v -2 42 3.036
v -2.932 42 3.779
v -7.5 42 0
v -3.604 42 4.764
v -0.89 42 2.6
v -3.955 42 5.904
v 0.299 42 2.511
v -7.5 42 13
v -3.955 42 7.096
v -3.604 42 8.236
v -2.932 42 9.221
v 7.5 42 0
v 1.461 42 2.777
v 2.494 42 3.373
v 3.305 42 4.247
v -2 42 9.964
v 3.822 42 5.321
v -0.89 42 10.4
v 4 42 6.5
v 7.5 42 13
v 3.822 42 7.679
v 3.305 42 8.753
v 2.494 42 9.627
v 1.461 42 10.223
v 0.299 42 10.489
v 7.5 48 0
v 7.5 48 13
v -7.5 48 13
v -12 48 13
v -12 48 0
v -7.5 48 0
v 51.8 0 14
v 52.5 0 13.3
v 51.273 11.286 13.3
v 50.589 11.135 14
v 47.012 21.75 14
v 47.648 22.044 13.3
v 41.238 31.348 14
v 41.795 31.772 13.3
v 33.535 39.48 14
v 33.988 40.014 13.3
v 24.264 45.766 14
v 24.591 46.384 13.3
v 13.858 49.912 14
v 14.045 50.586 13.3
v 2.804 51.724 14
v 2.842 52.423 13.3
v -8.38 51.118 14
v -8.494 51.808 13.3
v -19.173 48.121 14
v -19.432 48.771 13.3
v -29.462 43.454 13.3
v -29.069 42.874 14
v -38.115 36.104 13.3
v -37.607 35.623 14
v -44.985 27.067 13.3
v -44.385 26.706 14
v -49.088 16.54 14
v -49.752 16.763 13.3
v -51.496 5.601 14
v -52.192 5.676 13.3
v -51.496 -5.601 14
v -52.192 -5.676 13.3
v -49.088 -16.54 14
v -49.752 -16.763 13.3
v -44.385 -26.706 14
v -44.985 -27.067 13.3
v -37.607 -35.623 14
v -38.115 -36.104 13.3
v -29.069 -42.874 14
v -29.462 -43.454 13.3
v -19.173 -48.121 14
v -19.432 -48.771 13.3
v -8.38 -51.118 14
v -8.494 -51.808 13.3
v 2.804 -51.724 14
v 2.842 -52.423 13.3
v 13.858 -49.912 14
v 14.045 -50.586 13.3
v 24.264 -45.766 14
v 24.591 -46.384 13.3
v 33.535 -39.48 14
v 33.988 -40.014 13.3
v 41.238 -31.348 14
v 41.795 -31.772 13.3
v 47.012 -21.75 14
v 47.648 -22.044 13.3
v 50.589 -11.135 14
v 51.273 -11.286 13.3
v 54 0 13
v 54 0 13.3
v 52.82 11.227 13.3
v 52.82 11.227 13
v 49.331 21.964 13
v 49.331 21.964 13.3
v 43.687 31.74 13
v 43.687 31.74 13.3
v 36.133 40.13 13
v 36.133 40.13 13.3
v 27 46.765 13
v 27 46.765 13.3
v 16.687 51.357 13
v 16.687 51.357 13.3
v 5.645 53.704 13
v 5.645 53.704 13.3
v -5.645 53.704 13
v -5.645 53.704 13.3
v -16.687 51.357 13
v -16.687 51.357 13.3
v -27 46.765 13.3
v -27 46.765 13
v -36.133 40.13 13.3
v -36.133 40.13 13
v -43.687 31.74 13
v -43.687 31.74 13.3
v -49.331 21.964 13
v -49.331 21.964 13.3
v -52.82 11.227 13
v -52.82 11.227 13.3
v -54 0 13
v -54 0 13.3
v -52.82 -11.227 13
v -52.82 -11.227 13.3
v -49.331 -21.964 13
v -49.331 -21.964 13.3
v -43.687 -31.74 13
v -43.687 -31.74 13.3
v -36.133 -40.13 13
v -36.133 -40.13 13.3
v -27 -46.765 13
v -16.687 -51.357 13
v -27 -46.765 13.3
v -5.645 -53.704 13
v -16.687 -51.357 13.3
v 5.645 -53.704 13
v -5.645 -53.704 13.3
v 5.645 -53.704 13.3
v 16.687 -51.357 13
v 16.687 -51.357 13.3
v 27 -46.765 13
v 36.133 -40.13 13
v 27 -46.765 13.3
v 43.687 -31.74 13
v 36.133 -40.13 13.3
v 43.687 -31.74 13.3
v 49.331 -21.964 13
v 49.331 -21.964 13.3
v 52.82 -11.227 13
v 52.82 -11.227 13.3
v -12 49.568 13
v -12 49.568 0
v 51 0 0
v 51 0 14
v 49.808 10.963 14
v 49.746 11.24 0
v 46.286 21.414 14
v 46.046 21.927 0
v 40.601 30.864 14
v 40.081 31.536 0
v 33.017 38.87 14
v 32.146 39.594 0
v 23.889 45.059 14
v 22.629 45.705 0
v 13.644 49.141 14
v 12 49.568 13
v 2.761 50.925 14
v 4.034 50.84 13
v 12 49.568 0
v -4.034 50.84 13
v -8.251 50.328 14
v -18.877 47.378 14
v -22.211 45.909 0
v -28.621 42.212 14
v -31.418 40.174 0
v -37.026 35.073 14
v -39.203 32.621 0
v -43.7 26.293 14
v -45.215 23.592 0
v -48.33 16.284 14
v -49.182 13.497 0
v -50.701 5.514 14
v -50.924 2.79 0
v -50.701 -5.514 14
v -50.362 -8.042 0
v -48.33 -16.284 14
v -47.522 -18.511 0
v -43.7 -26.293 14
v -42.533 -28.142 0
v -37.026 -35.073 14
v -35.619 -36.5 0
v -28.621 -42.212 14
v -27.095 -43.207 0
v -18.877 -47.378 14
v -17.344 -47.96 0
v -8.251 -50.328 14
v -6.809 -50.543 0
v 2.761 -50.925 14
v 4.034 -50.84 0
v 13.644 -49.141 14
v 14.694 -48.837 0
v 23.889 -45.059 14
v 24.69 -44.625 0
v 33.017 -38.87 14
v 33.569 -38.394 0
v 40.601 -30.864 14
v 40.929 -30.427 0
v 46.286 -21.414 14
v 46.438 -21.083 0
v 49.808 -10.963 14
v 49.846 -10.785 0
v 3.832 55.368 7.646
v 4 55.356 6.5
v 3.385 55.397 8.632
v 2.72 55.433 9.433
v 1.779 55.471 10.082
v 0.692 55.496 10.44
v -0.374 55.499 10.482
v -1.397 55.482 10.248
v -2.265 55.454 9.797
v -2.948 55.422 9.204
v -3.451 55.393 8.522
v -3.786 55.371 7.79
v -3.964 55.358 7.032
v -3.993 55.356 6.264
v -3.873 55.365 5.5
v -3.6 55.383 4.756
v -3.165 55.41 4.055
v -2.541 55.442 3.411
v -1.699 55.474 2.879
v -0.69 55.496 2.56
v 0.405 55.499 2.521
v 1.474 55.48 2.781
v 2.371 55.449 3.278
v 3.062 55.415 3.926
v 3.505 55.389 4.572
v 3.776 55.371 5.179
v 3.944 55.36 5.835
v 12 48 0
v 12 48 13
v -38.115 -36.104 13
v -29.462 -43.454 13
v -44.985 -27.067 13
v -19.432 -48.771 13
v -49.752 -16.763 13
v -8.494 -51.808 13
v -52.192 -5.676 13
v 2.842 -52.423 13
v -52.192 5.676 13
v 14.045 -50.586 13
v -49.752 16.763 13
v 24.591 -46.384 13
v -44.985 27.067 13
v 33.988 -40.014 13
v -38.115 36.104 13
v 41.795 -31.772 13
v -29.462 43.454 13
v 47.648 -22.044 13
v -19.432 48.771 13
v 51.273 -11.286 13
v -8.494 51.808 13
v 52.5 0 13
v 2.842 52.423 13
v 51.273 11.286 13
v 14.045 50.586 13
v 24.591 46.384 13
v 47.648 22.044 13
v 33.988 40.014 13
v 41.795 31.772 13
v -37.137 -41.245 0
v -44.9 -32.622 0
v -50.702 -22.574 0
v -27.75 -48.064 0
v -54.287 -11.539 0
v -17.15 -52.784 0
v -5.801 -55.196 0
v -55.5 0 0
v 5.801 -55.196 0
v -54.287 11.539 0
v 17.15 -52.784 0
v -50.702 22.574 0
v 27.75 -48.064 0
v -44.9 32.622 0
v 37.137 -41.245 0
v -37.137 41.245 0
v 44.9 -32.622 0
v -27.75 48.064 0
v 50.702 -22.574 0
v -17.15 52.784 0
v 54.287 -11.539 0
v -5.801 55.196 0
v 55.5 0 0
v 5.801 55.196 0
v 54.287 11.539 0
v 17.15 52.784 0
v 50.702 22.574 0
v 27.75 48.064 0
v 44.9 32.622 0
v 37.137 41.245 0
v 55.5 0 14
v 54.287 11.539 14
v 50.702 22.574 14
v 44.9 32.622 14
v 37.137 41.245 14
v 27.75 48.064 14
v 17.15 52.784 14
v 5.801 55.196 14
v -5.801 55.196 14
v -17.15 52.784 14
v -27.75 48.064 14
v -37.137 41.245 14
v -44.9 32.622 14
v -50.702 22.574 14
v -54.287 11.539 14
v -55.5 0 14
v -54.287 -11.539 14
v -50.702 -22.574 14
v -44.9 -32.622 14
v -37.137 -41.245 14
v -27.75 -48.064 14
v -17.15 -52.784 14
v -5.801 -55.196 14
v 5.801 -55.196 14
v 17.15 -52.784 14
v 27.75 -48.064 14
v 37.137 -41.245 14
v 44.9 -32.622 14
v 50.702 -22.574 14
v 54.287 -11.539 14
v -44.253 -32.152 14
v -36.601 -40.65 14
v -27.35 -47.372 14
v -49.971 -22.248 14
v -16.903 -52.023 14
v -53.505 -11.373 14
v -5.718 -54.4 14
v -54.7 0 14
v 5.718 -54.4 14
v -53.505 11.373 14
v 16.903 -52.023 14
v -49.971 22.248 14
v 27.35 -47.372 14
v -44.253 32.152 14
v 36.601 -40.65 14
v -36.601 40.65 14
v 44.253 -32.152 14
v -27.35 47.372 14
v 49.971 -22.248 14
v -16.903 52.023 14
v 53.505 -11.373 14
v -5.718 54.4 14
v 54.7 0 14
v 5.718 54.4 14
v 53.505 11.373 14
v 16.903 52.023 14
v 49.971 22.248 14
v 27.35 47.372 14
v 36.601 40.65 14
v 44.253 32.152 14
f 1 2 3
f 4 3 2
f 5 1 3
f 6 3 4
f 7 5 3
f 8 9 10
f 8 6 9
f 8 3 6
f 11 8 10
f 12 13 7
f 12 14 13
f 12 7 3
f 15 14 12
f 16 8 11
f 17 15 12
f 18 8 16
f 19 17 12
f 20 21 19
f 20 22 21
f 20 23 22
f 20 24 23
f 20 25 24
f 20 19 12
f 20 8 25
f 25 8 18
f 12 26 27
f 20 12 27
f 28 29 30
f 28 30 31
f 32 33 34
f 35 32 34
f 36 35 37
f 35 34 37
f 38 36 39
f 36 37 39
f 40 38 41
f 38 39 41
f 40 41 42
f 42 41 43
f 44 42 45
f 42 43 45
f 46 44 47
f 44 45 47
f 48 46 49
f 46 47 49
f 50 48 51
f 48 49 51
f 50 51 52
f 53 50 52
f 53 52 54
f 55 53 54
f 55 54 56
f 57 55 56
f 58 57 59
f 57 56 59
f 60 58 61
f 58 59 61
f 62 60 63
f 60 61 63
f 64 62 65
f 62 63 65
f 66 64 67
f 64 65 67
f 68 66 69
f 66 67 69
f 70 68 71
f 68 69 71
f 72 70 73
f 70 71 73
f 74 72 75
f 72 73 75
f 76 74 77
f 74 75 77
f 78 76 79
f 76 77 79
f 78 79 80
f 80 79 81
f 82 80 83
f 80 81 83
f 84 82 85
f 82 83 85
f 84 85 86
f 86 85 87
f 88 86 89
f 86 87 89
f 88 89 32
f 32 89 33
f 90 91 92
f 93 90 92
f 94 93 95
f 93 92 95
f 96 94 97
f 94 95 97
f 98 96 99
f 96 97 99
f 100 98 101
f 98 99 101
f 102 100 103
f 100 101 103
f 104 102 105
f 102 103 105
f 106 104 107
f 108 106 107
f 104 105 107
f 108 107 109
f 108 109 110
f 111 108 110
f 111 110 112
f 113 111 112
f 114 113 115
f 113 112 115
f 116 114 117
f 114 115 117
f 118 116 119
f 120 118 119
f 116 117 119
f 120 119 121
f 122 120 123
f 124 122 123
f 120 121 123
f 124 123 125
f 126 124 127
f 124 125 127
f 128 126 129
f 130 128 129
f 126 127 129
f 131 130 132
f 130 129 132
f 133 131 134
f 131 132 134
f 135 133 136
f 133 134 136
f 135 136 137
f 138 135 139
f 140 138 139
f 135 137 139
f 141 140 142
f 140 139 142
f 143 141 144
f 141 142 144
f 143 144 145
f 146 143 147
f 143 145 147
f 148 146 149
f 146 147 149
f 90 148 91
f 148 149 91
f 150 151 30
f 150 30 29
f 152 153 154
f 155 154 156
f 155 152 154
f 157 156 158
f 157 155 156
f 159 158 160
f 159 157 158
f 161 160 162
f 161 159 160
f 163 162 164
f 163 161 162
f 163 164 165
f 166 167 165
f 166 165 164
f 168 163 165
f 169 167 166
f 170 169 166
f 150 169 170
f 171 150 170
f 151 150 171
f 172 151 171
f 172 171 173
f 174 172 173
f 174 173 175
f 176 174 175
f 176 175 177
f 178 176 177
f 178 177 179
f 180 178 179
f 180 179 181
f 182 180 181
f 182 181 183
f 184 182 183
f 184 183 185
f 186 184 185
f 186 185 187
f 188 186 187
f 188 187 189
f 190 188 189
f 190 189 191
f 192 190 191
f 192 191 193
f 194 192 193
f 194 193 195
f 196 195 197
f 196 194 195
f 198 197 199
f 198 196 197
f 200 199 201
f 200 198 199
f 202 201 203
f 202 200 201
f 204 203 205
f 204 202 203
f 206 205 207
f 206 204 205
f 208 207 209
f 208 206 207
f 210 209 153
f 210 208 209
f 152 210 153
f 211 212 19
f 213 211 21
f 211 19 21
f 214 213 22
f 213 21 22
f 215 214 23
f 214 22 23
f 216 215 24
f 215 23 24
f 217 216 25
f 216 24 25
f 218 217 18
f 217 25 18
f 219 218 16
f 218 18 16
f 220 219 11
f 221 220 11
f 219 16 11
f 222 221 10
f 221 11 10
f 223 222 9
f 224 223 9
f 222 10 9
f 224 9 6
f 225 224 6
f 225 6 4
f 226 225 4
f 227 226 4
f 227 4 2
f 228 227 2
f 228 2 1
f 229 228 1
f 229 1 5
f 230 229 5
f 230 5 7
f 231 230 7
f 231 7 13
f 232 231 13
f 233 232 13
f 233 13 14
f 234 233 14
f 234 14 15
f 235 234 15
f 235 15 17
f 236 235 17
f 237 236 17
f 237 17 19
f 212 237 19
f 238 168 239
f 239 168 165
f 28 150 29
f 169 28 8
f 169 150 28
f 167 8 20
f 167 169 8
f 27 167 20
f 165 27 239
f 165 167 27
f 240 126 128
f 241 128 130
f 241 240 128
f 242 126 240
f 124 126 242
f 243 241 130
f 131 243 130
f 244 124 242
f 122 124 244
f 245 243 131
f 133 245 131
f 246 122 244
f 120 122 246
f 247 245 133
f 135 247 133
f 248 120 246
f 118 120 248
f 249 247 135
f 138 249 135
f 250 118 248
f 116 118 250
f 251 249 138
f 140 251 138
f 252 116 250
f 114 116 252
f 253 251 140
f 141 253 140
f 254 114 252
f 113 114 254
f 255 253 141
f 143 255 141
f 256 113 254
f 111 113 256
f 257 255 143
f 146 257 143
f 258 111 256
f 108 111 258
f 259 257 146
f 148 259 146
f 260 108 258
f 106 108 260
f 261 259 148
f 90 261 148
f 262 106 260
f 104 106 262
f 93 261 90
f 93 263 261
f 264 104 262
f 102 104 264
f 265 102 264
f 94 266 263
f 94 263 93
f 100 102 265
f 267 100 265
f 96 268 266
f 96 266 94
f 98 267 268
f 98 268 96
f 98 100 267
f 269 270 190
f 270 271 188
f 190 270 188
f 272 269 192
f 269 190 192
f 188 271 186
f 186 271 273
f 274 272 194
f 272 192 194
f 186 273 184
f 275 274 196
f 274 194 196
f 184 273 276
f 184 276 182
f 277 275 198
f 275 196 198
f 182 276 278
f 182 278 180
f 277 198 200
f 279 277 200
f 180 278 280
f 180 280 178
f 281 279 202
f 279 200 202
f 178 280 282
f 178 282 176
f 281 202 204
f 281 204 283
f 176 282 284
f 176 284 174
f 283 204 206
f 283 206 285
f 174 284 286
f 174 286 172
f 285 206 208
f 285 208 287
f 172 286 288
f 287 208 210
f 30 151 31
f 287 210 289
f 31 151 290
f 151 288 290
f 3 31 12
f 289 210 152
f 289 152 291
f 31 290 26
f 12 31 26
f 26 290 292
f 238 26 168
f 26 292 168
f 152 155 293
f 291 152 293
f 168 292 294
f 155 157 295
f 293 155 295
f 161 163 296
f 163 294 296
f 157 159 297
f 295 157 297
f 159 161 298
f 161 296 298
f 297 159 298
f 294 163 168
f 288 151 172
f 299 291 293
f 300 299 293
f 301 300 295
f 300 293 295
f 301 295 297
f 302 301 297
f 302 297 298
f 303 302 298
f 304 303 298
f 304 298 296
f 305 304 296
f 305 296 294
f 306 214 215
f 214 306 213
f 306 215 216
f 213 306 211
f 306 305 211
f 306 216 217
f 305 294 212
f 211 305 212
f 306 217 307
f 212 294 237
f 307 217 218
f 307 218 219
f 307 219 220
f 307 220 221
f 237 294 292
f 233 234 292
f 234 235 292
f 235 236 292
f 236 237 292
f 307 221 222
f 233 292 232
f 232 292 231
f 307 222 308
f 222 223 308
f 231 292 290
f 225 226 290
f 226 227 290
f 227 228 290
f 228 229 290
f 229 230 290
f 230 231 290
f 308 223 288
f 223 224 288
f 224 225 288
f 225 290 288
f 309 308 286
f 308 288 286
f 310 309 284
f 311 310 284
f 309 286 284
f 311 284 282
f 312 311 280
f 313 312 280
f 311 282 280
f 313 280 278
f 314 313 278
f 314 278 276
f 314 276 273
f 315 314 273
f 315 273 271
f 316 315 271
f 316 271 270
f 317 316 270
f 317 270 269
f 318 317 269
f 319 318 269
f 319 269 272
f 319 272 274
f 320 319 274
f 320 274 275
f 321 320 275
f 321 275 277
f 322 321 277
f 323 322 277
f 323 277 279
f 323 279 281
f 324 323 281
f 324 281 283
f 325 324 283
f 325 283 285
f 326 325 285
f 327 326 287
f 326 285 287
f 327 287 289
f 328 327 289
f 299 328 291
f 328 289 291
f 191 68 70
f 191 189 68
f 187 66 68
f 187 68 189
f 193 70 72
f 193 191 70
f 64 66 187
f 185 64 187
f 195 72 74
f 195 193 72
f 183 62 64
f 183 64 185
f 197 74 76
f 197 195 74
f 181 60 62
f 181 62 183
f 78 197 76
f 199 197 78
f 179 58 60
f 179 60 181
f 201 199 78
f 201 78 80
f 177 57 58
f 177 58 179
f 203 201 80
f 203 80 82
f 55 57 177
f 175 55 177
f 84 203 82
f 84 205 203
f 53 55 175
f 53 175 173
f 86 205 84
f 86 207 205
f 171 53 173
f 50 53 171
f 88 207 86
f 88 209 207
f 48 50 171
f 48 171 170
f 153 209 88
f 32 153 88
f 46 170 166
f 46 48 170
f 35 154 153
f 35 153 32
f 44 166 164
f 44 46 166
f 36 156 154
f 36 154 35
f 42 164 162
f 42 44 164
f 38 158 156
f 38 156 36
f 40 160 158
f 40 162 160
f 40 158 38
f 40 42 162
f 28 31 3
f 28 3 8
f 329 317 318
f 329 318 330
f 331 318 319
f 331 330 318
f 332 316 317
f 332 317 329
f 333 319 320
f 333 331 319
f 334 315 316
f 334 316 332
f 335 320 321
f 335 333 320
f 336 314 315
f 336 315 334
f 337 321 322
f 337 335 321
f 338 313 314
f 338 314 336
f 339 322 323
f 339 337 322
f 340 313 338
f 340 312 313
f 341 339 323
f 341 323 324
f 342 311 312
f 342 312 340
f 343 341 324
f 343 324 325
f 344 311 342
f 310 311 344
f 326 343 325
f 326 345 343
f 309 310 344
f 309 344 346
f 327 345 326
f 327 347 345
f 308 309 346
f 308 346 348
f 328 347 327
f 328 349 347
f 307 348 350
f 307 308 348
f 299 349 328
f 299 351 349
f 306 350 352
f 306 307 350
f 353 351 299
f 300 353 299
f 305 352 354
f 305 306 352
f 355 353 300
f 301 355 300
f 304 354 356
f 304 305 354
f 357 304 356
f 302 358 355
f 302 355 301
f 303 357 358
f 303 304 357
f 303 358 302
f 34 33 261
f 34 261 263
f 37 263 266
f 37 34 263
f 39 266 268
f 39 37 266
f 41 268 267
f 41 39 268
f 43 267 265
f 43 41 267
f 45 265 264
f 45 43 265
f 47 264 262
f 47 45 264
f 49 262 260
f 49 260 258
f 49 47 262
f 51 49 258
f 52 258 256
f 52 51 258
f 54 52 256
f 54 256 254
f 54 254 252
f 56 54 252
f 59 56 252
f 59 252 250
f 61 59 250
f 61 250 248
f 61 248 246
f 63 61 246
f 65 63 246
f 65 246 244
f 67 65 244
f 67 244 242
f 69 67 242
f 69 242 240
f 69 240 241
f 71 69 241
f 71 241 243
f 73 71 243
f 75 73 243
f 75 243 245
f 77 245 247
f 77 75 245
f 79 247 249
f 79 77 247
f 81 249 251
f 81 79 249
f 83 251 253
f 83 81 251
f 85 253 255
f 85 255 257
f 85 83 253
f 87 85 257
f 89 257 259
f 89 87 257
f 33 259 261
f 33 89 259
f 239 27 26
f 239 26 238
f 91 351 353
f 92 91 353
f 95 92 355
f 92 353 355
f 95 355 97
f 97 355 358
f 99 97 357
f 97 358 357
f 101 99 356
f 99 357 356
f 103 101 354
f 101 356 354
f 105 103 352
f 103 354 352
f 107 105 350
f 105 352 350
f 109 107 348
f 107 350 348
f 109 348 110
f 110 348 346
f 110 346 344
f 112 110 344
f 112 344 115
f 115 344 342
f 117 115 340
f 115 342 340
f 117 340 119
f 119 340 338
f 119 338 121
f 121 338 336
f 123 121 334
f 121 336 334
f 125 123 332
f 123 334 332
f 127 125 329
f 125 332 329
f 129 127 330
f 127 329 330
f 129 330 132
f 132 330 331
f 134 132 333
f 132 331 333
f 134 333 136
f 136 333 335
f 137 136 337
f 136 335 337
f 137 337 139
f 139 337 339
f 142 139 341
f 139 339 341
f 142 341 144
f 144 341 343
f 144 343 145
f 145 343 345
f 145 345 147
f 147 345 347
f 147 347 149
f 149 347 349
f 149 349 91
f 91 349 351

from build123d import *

# Parameters (mm, degrees)
SKETCH_R        = 55.5
SKETCH_R_2      = 51
PAD_DEPTH       = 14
SKETCH001_R     = 54
SKETCH001_R_2   = 52.5
POCKET_DEPTH    = 1
SKETCH003_W     = 15
SKETCH003_H     = 13
PAD001_DEPTH    = 10
SKETCH004_W     = 24
SKETCH004_H     = 13
PAD002_DEPTH    = 4
SKETCH002_R     = 4
POCKET001_DEPTH = 55.501
CHAMFER_SIZE    = 0.7
CHAMFER001_SIZE = 0.7


with BuildPart() as part:
    # Sketch → Pad (new body)
    with BuildSketch(Plane.XY):
        Circle(SKETCH_R)
        Circle(SKETCH_R_2, mode=Mode.SUBTRACT)
    extrude(amount=PAD_DEPTH)

    # Sketch001 (on Face4 of Pad) → Pocket (cut)
    with BuildSketch(Plane.XY.offset(14)):
        Circle(SKETCH001_R)
        Circle(SKETCH001_R_2, mode=Mode.SUBTRACT)
    extrude(amount=-POCKET_DEPTH, mode=Mode.SUBTRACT)

    # Sketch003 → Pad001 (join)
    with BuildSketch(Plane.XZ.offset(-52)):
        with Locations((0, 6.5)):
            Rectangle(SKETCH003_W, SKETCH003_H)
    extrude(amount=PAD001_DEPTH)

    # Sketch004 → Pad002 (join)
    with BuildSketch(Plane.XZ.offset(-52)):
        with Locations((0, 6.5)):
            Rectangle(SKETCH004_W, SKETCH004_H)
    extrude(amount=PAD002_DEPTH)

    # Sketch002 → Pocket001 (cut, through all)
    with BuildSketch(Plane.XZ):
        with Locations((0, 6.5)):
            Circle(SKETCH002_R)
    extrude(amount=-POCKET001_DEPTH, mode=Mode.SUBTRACT)

    # Chamfer
    chamfer_edges = [part.edges().sort_by_distance(p)[0] for p in [
        (-52.5, 0, 14),
    ]]
    chamfer(chamfer_edges, length=CHAMFER_SIZE)

    # Chamfer001
    chamfer001_edges = [part.edges().sort_by_distance(p)[0] for p in [
        (-54, 0, 14),
    ]]
    chamfer(chamfer001_edges, length=CHAMFER001_SIZE)


solid = part.part
